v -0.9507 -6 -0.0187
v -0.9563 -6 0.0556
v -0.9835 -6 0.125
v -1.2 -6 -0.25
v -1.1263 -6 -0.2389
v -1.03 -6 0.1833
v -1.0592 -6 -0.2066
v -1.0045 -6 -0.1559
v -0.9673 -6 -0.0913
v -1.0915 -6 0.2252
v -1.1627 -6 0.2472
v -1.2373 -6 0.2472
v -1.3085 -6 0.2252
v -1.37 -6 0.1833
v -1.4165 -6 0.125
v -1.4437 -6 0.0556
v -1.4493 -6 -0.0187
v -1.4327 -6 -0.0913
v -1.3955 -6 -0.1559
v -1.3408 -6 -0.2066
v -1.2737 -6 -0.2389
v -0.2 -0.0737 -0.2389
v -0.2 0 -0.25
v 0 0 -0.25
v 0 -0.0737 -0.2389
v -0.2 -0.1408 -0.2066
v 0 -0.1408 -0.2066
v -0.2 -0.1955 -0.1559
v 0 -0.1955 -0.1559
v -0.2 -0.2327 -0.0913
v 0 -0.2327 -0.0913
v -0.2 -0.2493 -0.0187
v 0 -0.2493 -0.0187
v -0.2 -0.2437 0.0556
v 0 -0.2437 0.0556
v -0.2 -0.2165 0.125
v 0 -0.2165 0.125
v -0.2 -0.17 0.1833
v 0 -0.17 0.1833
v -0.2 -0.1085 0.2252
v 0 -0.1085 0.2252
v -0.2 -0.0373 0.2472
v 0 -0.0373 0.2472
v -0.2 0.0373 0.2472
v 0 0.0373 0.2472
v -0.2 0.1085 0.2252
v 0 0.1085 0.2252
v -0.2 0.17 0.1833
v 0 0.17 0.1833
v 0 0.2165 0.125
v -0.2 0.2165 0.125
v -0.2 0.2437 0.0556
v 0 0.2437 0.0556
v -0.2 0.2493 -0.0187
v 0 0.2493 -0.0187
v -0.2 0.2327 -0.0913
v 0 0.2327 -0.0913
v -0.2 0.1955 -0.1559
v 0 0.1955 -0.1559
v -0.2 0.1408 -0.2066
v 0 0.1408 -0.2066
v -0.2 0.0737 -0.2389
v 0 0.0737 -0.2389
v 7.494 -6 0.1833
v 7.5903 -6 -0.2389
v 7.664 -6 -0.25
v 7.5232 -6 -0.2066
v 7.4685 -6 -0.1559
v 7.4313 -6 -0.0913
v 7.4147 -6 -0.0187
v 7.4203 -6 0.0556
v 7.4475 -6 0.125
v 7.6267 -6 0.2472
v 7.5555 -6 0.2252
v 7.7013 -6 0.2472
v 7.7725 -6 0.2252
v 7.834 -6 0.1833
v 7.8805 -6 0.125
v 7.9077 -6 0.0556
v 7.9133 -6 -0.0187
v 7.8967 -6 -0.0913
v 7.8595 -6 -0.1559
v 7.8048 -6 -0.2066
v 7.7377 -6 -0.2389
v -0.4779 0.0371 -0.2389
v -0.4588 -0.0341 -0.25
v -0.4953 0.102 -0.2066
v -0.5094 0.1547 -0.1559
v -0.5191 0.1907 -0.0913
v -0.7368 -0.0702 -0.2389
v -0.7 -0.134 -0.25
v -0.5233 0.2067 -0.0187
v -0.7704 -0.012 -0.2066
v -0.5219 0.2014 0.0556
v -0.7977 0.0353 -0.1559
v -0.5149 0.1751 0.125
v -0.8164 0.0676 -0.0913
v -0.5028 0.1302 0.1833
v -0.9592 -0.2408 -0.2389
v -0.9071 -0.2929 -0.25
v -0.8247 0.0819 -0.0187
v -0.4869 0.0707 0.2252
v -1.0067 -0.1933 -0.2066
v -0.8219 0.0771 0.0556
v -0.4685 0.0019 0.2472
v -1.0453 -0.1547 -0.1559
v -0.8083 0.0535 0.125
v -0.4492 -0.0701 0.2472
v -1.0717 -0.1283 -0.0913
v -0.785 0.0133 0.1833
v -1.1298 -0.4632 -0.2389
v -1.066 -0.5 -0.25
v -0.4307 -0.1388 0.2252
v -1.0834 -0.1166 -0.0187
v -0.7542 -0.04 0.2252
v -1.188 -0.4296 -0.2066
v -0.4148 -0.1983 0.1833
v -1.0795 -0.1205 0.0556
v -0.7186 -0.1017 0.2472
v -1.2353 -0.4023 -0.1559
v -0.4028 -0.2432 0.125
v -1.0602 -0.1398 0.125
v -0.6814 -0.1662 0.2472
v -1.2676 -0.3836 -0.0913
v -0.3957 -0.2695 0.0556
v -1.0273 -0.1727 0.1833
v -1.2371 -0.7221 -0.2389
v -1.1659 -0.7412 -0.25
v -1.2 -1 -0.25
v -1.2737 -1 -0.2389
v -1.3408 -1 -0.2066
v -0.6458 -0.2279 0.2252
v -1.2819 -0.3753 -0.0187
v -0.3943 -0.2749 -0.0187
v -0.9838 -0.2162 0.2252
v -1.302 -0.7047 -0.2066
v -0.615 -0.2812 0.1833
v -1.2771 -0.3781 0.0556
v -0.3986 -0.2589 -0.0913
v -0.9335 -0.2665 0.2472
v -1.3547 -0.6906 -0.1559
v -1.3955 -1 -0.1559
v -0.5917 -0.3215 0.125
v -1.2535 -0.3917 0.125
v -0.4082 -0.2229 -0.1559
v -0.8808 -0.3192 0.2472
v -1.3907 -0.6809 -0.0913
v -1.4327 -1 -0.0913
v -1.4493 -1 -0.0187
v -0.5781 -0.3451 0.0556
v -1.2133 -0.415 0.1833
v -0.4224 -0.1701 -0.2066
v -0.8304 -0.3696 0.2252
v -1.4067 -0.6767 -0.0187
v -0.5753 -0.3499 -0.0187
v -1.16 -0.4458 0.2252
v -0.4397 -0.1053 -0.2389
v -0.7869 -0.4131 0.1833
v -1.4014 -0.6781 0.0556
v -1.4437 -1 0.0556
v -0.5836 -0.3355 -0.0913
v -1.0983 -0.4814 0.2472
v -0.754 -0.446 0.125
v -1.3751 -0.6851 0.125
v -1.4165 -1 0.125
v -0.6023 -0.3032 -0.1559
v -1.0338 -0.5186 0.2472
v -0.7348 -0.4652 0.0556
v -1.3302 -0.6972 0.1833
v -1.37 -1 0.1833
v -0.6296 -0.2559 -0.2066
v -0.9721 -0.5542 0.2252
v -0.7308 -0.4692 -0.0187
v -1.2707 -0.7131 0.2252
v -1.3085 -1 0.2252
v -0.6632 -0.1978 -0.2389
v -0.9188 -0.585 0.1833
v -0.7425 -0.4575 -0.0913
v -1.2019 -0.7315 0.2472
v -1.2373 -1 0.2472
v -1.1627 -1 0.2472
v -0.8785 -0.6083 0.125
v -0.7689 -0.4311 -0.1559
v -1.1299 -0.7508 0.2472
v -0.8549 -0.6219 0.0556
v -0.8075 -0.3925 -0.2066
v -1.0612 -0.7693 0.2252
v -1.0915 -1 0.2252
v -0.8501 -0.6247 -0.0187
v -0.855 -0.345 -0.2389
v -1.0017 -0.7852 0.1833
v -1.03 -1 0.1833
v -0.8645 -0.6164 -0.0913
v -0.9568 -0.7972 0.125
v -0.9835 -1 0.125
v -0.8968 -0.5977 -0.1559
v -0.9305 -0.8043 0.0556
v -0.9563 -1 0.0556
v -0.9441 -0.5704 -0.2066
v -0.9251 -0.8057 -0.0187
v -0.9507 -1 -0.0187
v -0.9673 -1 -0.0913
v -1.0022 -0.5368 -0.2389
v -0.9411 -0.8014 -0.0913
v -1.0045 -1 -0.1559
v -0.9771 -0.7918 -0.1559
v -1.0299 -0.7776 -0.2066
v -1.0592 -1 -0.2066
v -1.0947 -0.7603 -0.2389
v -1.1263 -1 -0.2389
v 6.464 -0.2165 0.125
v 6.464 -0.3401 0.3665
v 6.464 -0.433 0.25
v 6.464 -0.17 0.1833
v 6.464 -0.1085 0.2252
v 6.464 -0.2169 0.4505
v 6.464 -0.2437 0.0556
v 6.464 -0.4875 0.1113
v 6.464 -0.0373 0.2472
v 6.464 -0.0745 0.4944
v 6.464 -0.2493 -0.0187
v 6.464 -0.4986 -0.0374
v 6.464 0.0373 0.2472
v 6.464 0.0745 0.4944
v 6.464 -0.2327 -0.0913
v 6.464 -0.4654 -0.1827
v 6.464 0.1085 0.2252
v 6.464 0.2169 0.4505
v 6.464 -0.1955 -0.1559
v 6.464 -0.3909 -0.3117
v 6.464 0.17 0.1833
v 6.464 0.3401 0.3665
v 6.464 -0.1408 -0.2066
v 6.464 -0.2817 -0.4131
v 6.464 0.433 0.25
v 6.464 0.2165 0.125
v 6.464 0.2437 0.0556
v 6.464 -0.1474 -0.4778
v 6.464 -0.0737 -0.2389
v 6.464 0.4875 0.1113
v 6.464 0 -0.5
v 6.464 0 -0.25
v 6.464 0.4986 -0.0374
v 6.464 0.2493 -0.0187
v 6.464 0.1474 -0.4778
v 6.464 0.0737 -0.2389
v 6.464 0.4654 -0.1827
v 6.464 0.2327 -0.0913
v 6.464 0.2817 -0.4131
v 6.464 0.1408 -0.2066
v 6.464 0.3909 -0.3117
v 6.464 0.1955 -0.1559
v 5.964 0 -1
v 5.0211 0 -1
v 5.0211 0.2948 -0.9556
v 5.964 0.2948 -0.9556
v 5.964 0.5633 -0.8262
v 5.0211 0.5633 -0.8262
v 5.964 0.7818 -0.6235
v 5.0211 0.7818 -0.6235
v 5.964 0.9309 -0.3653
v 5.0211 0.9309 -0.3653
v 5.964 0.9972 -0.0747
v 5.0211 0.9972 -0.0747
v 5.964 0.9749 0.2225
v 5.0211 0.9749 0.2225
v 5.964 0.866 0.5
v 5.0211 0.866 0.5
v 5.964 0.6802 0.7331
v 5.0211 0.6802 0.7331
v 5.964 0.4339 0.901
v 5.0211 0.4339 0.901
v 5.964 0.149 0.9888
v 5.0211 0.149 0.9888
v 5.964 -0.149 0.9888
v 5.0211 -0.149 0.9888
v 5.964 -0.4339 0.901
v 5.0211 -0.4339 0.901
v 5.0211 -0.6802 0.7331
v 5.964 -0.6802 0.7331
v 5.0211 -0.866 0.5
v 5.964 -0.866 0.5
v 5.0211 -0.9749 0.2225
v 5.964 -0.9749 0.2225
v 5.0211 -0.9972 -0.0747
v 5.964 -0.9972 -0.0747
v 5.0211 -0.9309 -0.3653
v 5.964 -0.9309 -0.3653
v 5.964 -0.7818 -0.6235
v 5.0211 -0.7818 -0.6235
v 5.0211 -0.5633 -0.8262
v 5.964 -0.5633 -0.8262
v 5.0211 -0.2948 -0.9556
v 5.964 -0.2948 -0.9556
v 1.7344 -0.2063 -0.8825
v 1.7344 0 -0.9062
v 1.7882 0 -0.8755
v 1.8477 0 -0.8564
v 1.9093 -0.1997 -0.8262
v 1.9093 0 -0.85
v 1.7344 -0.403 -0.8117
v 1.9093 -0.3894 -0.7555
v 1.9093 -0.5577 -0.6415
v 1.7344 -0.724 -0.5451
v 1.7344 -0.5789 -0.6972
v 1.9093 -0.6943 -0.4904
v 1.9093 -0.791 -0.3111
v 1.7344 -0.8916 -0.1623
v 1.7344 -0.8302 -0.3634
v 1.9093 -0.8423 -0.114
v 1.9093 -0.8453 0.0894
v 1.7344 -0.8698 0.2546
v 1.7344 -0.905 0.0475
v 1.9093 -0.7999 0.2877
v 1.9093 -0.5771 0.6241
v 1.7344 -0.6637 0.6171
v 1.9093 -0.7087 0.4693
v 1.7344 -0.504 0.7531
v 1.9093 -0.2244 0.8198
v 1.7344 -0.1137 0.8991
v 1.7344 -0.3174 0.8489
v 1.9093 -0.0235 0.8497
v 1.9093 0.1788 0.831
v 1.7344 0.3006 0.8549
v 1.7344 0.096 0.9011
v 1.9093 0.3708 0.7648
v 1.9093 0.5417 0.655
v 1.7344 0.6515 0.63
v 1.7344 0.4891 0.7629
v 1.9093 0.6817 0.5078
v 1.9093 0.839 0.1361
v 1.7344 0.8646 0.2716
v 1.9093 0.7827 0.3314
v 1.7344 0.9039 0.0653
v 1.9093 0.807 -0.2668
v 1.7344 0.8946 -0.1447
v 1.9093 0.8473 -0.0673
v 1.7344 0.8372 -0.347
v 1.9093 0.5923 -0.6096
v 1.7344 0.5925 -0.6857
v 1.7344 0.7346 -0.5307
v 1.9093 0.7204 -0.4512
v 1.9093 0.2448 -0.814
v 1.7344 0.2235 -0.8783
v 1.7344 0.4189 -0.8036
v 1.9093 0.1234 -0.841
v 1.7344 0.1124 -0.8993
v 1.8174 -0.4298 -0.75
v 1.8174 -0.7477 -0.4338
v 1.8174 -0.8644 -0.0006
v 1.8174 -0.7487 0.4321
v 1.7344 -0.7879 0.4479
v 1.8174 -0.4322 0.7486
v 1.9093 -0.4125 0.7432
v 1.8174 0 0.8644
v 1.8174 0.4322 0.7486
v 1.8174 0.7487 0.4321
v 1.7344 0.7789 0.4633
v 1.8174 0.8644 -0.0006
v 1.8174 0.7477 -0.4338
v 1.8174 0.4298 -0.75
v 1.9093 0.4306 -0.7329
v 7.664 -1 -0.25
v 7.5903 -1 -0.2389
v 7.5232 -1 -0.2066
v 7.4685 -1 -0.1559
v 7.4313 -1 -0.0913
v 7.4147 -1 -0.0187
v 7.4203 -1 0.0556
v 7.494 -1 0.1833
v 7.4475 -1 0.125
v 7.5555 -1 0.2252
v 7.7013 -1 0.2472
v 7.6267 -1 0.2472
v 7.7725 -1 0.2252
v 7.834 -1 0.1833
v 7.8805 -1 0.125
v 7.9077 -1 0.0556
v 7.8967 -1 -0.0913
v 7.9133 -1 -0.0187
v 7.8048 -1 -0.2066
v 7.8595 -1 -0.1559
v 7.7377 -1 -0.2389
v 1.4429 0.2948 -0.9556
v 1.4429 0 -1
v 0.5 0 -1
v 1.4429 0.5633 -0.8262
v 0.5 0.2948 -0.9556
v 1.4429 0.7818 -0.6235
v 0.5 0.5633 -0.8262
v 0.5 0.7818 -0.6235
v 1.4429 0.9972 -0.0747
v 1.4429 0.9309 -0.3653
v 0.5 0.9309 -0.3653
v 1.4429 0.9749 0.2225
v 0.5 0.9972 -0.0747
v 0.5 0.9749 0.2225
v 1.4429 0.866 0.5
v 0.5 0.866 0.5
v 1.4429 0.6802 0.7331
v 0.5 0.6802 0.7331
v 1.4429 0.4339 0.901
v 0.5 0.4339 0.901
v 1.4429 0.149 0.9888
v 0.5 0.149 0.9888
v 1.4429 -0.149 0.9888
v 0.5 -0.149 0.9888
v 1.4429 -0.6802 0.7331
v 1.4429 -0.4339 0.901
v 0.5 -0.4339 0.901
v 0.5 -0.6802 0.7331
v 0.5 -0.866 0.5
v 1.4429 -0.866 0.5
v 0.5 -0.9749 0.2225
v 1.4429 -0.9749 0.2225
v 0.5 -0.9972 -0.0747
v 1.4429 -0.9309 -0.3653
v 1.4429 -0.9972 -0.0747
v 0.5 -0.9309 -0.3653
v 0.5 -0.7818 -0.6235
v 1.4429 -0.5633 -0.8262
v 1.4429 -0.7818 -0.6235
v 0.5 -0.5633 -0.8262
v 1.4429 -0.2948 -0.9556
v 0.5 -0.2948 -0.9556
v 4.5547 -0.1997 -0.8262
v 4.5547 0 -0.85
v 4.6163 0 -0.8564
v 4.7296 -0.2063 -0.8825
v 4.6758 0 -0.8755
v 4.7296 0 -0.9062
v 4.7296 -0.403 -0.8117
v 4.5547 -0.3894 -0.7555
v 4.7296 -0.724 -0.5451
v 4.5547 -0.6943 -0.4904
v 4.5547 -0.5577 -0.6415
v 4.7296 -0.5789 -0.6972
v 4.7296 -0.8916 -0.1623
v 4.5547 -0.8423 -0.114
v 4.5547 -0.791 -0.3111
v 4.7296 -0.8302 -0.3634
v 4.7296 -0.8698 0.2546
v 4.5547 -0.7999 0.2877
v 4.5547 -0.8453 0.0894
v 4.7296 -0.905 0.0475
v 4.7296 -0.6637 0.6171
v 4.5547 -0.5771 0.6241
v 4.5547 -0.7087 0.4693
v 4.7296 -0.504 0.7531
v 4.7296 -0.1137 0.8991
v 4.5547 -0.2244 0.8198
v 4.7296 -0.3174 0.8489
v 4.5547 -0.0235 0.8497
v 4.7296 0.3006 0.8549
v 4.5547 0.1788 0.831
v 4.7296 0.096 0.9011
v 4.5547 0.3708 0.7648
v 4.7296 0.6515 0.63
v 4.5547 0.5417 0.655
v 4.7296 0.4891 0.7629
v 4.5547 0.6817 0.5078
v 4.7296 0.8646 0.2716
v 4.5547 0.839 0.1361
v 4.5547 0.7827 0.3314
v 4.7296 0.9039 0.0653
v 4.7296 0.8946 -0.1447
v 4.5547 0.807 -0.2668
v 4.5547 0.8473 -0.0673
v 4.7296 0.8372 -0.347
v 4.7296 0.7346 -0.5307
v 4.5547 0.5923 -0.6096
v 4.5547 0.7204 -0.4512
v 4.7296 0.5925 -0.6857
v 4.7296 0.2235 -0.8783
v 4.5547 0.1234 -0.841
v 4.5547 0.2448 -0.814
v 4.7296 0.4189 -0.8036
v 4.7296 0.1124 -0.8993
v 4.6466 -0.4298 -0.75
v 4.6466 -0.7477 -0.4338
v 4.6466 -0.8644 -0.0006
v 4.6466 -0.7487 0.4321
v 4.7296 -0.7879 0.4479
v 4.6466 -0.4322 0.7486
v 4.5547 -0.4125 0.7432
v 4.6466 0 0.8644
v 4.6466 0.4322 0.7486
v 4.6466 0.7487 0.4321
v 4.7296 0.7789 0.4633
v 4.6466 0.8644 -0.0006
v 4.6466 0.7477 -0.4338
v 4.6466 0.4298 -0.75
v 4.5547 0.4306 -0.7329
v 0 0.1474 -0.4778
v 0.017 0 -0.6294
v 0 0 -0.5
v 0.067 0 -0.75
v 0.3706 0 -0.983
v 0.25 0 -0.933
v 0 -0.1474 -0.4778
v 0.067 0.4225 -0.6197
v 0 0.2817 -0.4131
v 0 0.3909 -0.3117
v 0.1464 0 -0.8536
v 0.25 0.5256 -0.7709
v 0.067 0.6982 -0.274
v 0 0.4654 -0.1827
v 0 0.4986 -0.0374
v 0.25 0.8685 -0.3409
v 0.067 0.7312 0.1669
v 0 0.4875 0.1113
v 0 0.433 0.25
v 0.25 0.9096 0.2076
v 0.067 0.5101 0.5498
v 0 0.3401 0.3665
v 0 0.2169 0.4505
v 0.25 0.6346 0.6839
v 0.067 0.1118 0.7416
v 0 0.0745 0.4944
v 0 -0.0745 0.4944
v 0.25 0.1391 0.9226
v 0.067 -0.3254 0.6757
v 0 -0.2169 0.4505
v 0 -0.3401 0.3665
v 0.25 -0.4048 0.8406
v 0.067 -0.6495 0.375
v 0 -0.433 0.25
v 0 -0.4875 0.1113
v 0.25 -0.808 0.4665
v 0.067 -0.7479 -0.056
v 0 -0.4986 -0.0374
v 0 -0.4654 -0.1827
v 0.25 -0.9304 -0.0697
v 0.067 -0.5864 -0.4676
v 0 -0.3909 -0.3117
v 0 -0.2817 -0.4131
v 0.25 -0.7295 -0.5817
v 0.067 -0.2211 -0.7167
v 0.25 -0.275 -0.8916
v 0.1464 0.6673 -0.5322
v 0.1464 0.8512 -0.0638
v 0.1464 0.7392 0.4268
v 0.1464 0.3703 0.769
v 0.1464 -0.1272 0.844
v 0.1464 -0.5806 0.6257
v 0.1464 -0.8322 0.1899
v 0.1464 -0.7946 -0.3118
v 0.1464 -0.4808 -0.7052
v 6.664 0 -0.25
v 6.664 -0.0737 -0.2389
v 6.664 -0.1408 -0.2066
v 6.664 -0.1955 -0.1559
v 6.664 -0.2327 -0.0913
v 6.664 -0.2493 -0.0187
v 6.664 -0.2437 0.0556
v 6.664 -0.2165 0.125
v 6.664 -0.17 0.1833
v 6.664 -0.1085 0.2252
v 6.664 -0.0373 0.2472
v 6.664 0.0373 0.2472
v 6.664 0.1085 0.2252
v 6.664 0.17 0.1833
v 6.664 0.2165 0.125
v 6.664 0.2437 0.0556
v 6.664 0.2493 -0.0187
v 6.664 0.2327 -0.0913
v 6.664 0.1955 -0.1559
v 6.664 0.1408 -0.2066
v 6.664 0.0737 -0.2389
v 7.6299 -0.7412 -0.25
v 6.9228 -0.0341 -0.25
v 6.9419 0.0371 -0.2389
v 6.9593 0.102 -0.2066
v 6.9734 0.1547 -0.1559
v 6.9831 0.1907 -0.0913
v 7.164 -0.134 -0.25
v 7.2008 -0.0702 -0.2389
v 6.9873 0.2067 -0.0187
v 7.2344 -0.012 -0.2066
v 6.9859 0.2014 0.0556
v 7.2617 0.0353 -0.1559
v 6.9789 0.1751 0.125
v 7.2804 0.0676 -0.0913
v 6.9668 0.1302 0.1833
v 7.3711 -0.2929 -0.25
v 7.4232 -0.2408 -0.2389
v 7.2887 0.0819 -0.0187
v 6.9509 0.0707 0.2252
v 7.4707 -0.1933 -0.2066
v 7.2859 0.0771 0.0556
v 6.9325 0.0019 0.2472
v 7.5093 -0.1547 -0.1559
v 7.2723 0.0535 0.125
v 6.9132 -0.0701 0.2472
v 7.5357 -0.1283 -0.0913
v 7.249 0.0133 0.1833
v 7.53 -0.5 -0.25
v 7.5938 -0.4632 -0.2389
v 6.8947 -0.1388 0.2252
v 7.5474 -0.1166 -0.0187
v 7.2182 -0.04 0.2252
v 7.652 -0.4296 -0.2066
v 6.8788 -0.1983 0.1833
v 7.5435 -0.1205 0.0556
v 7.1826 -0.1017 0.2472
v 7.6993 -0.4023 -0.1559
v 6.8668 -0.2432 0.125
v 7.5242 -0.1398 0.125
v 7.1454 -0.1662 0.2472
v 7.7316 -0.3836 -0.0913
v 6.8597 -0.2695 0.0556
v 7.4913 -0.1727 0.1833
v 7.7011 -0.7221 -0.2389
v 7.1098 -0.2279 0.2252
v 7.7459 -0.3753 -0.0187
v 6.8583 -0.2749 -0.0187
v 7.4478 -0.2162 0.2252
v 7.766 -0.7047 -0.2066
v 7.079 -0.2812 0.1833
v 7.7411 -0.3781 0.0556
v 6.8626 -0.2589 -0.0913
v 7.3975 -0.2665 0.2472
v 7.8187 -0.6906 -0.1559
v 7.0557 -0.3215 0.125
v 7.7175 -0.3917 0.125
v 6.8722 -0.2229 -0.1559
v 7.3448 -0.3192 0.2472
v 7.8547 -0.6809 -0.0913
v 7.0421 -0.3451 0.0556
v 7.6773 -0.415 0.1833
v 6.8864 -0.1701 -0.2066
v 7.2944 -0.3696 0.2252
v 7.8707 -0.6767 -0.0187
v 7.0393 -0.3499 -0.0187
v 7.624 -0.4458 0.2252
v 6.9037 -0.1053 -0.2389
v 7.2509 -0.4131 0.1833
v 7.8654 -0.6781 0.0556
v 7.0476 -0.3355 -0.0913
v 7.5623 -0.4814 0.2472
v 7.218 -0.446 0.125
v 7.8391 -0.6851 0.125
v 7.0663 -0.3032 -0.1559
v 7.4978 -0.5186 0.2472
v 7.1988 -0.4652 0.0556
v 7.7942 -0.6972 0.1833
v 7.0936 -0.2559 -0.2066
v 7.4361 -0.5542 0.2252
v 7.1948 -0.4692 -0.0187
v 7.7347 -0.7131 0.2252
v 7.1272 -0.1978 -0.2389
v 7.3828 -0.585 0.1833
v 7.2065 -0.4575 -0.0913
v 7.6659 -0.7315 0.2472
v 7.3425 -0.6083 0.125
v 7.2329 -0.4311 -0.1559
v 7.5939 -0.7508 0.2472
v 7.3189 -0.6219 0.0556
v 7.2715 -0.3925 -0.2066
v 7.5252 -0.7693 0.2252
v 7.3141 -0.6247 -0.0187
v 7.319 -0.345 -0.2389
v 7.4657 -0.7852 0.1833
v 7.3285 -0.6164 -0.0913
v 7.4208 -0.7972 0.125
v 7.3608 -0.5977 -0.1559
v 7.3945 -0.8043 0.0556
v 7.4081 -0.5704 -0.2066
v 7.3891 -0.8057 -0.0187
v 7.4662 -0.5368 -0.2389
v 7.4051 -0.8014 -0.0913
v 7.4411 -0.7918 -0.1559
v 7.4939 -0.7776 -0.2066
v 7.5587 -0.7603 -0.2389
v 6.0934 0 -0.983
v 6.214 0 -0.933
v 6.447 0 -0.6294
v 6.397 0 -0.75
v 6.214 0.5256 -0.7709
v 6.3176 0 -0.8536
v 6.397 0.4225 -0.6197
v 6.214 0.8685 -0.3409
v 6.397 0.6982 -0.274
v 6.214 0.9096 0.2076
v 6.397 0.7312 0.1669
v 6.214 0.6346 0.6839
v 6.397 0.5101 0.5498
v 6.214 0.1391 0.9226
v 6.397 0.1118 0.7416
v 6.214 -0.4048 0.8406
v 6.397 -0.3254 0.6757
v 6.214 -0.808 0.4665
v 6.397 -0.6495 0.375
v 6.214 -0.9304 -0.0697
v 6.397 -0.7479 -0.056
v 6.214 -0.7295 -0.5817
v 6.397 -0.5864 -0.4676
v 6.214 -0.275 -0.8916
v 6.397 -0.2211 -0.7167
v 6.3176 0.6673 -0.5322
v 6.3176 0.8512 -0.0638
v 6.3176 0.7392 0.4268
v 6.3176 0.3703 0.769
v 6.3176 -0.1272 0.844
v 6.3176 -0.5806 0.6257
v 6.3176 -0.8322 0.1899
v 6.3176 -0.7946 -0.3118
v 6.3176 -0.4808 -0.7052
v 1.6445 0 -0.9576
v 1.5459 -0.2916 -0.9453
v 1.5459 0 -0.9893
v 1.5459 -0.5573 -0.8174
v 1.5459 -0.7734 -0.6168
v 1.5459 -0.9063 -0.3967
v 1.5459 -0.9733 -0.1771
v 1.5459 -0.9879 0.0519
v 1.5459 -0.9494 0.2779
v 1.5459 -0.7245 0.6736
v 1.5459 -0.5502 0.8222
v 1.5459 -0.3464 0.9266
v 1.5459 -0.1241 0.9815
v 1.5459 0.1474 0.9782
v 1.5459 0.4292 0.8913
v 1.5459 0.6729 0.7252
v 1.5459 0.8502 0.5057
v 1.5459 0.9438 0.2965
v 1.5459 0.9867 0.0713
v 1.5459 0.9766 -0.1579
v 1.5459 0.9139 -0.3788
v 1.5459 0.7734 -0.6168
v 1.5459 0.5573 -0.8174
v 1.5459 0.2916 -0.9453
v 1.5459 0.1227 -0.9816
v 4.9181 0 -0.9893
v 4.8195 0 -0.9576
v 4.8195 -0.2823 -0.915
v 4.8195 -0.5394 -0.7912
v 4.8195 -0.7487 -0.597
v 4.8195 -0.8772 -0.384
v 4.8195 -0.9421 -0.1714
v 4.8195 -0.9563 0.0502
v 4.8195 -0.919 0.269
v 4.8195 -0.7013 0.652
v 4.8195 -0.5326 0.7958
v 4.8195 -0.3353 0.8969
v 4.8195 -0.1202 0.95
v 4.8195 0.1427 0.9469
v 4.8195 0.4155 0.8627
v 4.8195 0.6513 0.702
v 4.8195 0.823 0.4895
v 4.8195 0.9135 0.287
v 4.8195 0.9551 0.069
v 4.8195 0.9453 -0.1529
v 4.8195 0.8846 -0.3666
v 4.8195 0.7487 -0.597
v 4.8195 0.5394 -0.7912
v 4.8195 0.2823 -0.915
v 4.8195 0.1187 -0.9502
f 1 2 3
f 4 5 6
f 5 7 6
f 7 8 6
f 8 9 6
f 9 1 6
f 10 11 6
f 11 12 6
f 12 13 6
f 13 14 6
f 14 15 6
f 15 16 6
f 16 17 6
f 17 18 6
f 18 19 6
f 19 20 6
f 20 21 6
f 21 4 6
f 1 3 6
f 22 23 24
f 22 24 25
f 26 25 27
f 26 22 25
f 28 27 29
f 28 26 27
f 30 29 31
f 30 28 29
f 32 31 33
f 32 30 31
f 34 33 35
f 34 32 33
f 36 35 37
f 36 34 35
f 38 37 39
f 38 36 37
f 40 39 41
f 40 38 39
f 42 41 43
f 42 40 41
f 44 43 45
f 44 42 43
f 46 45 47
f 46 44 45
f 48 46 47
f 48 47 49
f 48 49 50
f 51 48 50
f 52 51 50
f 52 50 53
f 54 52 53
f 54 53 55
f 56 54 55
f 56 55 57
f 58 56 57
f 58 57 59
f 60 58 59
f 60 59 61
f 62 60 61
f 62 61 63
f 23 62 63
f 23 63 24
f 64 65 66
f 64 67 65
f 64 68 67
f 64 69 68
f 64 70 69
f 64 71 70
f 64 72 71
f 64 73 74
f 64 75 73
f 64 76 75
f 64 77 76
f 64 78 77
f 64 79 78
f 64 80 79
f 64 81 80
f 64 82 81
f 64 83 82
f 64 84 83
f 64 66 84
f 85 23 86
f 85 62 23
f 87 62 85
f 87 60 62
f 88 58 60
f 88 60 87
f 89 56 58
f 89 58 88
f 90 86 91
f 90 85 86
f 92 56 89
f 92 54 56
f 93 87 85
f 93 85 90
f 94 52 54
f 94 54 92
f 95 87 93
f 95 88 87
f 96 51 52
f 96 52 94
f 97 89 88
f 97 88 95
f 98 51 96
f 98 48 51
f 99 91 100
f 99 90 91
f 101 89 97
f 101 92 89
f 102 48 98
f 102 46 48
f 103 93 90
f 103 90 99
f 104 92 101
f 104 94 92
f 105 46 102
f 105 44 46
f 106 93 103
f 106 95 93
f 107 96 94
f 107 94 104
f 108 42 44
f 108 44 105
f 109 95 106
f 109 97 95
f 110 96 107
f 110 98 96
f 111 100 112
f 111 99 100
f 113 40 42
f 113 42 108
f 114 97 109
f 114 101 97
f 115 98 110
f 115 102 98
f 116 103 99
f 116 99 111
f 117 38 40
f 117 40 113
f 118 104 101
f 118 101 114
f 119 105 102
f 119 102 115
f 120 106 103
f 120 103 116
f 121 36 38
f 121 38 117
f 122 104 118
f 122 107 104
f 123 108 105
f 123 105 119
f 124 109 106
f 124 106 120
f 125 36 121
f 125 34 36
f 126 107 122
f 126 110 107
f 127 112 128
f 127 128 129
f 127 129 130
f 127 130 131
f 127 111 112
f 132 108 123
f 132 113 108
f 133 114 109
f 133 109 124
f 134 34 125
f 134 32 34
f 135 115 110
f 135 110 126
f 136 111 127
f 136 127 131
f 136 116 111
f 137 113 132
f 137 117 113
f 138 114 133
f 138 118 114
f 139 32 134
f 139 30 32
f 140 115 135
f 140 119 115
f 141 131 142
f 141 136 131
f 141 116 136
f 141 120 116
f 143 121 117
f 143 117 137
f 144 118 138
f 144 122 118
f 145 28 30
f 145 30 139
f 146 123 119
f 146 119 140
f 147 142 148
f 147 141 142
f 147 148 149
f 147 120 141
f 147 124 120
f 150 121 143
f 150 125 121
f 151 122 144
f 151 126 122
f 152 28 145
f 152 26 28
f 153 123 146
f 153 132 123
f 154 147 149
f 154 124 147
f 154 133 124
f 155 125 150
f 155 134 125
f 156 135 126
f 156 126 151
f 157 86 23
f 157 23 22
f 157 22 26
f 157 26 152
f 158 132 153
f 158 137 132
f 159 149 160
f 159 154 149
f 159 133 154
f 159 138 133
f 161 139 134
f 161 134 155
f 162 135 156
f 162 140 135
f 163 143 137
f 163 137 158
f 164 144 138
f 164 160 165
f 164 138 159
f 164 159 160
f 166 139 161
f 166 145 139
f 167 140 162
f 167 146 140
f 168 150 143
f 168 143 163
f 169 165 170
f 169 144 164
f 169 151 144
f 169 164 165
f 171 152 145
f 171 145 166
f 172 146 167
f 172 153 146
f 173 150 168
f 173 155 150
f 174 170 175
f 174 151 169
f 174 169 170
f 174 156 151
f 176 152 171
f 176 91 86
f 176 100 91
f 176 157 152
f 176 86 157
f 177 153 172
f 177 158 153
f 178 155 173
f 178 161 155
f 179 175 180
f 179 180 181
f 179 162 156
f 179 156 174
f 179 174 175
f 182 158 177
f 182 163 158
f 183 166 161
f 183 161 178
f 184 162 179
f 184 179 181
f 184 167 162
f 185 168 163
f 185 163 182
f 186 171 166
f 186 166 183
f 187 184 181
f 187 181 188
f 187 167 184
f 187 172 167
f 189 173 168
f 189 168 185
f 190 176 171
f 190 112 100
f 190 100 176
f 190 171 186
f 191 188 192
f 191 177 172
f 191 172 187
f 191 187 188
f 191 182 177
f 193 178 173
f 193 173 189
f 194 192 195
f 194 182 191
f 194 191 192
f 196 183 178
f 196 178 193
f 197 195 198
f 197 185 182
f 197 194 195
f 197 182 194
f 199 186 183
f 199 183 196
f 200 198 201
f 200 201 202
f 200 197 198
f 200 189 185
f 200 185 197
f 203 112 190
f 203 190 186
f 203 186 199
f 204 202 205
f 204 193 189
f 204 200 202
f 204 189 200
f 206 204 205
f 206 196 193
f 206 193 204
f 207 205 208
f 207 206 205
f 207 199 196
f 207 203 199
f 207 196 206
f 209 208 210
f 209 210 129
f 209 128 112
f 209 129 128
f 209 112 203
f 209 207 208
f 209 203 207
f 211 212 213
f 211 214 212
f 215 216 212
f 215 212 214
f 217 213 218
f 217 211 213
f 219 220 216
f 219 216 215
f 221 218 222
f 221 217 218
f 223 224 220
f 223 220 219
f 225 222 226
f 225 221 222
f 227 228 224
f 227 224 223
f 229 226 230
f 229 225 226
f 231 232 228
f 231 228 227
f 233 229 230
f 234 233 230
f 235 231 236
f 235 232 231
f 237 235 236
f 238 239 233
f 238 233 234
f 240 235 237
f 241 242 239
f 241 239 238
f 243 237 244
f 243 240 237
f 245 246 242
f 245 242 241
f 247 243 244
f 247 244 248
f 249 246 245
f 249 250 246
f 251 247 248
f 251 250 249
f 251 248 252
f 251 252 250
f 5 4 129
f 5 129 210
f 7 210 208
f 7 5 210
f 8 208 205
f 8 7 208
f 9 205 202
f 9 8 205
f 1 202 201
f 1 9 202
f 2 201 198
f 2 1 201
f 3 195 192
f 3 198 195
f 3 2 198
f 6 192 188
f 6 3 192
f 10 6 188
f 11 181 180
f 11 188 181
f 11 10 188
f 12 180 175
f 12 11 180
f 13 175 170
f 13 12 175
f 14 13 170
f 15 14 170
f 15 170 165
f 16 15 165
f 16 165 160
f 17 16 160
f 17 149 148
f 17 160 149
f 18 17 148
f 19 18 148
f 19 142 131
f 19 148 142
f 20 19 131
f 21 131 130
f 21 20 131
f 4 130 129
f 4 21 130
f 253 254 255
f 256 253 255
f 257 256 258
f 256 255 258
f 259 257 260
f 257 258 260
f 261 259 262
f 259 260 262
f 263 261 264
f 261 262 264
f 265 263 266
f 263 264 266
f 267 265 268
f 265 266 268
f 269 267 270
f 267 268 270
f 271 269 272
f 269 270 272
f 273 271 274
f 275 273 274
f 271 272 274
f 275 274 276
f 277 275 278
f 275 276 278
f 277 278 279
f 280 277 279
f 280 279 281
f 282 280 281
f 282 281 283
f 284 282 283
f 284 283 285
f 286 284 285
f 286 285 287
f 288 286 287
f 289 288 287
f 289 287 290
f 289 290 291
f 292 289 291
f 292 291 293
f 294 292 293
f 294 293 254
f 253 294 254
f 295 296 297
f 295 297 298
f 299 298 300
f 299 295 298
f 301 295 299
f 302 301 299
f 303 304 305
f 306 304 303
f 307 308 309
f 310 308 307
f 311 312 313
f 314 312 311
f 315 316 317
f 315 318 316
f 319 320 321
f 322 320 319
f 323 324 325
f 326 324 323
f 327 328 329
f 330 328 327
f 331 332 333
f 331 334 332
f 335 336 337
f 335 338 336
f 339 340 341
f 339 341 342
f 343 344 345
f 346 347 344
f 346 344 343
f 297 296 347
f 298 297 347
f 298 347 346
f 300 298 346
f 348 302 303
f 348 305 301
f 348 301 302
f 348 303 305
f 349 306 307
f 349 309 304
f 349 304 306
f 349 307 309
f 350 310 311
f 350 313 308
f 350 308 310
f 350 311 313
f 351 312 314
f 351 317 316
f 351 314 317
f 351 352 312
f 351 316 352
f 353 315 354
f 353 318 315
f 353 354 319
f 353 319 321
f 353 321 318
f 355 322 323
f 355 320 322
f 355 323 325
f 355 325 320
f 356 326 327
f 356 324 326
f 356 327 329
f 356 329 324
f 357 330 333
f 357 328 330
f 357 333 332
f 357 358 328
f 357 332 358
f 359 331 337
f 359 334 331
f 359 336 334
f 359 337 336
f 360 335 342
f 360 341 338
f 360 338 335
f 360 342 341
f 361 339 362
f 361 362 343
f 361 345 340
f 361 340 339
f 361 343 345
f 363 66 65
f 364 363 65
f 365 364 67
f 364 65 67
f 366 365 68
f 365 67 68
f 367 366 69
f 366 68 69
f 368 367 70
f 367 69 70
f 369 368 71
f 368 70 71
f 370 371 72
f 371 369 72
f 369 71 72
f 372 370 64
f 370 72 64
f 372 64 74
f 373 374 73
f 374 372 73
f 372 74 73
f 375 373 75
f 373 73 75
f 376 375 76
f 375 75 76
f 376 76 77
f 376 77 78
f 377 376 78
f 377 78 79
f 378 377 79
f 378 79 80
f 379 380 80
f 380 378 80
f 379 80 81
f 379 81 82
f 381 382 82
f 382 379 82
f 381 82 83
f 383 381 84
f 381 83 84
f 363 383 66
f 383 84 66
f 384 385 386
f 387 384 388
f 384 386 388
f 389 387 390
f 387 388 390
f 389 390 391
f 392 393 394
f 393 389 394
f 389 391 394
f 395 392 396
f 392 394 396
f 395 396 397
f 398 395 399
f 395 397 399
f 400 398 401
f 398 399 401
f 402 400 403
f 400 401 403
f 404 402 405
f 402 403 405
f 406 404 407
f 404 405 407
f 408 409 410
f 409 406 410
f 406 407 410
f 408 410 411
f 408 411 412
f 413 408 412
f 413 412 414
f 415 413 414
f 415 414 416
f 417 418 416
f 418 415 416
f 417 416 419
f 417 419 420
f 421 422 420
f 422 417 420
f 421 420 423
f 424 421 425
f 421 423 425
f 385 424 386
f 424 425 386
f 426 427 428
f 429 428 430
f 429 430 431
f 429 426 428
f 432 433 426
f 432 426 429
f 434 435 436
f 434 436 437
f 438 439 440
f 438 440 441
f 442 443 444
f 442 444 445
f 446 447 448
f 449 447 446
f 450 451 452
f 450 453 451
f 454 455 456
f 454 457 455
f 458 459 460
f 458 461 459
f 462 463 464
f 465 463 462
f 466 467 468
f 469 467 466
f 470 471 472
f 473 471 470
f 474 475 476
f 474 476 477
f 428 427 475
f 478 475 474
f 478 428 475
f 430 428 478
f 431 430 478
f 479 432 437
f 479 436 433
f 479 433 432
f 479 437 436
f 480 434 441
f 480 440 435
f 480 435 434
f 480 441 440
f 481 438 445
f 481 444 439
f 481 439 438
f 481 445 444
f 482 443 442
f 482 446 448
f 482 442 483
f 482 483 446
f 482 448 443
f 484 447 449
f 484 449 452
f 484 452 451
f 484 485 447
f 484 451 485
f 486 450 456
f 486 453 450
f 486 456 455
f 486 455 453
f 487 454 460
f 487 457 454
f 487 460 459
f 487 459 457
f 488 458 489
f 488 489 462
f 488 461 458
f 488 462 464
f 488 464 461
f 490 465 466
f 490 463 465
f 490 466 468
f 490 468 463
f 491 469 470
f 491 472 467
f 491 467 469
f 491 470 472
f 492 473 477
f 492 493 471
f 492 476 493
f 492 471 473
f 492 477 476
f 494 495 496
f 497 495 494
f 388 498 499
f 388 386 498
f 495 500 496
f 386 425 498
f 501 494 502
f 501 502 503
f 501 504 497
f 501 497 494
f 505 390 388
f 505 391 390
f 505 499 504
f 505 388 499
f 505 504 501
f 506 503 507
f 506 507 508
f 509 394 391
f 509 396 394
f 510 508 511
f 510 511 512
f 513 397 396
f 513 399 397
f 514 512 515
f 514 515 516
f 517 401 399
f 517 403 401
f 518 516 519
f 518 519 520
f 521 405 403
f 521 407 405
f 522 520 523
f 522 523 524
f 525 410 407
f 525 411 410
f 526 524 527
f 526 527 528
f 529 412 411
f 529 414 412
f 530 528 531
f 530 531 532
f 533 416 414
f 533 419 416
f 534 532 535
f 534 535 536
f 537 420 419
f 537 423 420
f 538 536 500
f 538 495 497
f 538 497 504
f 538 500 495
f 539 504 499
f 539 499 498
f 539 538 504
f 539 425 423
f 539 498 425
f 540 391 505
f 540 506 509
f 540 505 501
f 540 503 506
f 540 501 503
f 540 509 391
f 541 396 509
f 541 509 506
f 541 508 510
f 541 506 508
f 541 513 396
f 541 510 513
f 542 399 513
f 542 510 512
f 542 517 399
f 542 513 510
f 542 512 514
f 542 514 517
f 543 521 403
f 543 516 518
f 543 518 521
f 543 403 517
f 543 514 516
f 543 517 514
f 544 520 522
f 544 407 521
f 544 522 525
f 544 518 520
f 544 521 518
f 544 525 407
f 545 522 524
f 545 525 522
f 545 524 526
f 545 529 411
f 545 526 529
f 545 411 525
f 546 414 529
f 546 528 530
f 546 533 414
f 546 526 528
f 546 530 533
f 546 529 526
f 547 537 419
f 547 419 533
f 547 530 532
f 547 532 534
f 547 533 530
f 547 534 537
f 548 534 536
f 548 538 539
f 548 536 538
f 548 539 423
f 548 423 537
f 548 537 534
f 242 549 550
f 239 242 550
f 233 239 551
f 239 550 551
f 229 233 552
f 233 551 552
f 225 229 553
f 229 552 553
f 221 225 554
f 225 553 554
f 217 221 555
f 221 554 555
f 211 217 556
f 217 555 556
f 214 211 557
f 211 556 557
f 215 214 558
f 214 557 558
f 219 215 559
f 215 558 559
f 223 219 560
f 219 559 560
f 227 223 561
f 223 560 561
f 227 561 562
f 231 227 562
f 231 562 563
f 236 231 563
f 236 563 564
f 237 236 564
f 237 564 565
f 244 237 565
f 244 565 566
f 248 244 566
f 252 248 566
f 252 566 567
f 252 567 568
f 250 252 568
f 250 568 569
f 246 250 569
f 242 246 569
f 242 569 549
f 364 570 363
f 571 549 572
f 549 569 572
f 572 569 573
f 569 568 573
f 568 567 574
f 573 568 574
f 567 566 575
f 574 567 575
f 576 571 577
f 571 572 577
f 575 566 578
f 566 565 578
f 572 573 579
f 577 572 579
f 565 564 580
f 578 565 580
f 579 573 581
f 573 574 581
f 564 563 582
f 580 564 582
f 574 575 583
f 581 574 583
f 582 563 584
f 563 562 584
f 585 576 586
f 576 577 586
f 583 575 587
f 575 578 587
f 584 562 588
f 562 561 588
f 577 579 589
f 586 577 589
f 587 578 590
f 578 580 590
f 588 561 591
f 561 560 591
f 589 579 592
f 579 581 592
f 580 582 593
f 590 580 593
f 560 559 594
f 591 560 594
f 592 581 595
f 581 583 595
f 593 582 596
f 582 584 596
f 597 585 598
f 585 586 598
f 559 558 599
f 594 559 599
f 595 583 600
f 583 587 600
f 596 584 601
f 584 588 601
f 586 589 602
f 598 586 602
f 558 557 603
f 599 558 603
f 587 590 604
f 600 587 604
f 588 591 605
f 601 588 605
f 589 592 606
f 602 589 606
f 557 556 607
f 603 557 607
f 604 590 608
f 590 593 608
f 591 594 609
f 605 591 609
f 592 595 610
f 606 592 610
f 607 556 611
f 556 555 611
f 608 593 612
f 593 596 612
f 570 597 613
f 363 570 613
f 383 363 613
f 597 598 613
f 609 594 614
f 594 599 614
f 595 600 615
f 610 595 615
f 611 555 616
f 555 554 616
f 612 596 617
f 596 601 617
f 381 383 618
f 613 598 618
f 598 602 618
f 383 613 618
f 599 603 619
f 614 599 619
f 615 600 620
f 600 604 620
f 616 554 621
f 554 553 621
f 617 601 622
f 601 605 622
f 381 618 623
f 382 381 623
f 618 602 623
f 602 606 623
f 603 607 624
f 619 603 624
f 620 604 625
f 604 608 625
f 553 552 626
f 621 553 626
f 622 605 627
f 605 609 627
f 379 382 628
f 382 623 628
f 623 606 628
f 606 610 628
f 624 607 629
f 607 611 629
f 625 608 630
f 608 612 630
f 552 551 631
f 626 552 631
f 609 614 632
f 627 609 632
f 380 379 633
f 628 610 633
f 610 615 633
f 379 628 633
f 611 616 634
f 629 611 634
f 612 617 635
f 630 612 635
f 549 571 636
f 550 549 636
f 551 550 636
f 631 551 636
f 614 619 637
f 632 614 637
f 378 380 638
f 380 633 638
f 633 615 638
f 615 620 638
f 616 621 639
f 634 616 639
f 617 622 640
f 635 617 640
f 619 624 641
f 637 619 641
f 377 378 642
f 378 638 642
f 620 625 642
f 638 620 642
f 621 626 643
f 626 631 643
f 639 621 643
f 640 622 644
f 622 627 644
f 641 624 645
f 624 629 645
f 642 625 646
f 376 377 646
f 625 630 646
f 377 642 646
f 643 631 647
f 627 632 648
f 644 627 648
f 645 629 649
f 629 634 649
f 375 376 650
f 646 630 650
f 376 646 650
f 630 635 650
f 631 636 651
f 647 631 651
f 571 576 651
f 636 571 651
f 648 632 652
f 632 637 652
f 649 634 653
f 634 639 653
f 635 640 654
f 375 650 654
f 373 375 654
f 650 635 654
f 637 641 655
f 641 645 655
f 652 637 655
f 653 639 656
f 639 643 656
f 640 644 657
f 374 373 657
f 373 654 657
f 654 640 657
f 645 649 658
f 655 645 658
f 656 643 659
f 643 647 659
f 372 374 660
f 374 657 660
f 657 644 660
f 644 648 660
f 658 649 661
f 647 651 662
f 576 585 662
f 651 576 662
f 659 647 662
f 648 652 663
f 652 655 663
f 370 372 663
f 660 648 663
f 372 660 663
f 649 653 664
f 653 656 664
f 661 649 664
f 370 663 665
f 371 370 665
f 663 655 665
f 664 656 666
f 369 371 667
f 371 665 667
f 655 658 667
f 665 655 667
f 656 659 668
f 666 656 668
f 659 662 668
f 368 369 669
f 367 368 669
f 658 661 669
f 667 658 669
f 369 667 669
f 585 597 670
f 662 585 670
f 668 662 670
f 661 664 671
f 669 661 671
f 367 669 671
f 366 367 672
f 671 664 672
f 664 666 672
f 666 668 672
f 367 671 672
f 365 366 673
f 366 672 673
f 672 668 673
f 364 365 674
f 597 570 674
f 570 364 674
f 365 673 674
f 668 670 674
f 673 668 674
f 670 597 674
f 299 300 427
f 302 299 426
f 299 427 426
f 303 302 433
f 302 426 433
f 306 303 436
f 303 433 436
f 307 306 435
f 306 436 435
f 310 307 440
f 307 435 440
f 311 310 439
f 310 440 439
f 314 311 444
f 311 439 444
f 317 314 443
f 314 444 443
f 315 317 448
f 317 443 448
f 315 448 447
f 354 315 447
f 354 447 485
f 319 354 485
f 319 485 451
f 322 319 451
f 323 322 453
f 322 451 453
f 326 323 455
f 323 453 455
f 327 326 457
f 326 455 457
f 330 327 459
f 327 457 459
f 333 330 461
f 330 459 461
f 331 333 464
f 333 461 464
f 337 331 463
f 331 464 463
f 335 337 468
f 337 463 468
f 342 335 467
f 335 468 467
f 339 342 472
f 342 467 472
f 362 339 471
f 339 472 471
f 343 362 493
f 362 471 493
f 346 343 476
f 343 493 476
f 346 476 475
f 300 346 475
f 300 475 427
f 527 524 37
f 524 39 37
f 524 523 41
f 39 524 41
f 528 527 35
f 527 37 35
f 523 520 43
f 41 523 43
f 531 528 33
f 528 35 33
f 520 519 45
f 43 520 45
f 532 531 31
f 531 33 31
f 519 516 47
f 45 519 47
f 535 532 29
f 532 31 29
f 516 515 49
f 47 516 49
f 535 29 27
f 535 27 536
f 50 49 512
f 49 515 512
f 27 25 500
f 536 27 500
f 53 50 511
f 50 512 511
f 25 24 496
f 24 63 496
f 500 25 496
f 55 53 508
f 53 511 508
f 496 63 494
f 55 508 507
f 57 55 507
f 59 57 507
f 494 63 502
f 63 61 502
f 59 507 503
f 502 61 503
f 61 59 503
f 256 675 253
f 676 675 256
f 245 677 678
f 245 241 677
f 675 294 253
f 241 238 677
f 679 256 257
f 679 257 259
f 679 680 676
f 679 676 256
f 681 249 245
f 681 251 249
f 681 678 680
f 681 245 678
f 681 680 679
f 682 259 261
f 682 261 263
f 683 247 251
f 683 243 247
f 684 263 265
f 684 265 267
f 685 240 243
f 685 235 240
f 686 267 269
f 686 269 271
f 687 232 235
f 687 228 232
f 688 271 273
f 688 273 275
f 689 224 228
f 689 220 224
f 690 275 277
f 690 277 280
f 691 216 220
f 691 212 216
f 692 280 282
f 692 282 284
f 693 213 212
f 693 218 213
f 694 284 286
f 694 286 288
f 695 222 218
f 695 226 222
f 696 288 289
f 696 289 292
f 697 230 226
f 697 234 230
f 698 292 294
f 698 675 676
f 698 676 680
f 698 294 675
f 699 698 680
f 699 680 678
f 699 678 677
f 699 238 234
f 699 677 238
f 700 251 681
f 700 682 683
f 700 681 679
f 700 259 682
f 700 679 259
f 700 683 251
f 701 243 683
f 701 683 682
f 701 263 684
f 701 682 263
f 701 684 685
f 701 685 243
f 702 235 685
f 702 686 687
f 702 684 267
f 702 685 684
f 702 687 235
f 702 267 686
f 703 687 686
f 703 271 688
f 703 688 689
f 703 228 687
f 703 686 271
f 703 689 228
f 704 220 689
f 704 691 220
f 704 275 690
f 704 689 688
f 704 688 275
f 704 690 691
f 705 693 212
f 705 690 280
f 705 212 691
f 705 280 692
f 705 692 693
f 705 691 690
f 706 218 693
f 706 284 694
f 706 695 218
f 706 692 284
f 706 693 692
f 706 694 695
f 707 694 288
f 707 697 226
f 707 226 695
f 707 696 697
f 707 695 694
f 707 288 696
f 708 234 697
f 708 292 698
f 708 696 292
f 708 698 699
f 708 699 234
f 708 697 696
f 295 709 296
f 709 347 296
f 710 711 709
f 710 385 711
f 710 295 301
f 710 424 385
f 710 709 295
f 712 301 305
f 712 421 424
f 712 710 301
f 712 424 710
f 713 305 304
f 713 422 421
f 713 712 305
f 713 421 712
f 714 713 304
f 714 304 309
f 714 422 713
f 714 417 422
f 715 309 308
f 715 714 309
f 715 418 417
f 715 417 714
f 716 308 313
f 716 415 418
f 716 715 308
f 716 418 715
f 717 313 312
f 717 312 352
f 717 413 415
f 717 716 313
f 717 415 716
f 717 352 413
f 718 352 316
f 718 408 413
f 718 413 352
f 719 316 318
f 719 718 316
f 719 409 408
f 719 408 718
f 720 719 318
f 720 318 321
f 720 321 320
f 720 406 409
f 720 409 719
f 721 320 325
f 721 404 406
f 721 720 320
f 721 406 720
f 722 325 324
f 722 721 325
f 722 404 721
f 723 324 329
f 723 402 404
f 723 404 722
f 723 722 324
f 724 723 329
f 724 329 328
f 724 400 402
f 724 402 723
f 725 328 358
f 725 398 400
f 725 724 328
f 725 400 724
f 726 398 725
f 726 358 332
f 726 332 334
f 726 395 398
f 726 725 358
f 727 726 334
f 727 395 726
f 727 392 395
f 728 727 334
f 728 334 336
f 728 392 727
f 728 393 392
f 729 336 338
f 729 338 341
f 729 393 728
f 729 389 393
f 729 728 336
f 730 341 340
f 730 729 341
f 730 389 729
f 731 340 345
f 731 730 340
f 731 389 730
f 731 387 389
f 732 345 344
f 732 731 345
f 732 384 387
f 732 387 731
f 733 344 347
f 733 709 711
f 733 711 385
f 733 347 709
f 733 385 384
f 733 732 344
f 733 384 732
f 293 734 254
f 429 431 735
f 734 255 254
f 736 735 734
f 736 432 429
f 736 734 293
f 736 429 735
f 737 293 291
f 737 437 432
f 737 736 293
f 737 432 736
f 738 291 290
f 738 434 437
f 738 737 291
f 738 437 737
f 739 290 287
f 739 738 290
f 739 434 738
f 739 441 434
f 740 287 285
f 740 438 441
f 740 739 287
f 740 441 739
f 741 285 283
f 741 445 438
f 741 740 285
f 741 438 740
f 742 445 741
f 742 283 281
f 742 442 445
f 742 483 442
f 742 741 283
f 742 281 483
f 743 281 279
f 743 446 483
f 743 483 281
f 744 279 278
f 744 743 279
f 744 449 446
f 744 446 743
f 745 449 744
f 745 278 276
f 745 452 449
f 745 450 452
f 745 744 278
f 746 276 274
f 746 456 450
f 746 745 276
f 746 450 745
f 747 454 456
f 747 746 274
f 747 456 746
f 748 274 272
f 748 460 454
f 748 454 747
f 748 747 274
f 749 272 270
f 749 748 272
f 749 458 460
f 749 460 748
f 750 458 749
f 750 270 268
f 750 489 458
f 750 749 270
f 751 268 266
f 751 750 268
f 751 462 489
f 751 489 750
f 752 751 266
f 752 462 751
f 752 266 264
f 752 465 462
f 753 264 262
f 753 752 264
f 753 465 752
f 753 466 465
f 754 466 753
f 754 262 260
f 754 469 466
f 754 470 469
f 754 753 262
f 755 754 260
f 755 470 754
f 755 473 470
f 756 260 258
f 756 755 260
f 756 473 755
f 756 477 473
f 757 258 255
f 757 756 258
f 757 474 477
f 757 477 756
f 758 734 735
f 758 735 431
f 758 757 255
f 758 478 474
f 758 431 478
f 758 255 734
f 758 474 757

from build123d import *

# Parameters (mm, degrees)
SKETCH58_R          = 1
BOSS_EXTRUDE1_DEPTH = 6.464
SKETCH59_W          = 2.864
SKETCH59_H          = 0.3
FILLET6_R           = 0.5
FILLET7_R           = 0.3
SKETCH54_R          = 0.25


with BuildPart() as part:
    # Sketch58 → Boss-Extrude1 (new body)
    with BuildSketch(Plane(origin=(0, 0, 0), x_dir=(0, 0, -1), z_dir=(1, 0, 0))):
        Circle(SKETCH58_R)
    extrude(amount=BOSS_EXTRUDE1_DEPTH)

    # Sketch59 → Cut-Revolve1 (revolve, cut)
    with BuildSketch(Plane.XY, mode=Mode.PRIVATE) as cut_revolve1_sk:
        with Locations((3.232, 1)):
            Rectangle(SKETCH59_W, SKETCH59_H)
    revolve(cut_revolve1_sk.sketch.rotate(Axis((6.464, 0, 0), (-1, 0, 0)), 90), axis=Axis((6.464, 0, 0), (-1, 0, 0)), mode=Mode.SUBTRACT)

    # Fillet6
    # the kernel refuses this fillet: 0.5 mm, written as the material it takes off along each edge
    with BuildSketch(Plane(origin=(0, 0, 0), x_dir=(0, 0, -1), z_dir=(0, -1, 0))) as fillet6_piece_1:
        with BuildLine():
            CenterArc((1 - FILLET6_R, FILLET6_R), FILLET6_R, 270, 90)
            Line((1 - FILLET6_R, 0), (1 - FILLET6_R, -FILLET6_R * 0.02))
            Line((1 - FILLET6_R, -FILLET6_R * 0.02), (1 + FILLET6_R * 0.02, -FILLET6_R * 0.02))
            Line((1 + FILLET6_R * 0.02, -FILLET6_R * 0.02), (1 + FILLET6_R * 0.02, FILLET6_R))
            Line((1 + FILLET6_R * 0.02, FILLET6_R), (1, FILLET6_R))
        make_face()
    revolve(axis=Axis((0, 0, 0), (1, 0, 0)), mode=Mode.SUBTRACT)
    with BuildSketch(Plane(origin=(6.464, 0, 0), x_dir=(0, 0, -1), z_dir=(0, -1, 0))) as fillet6_piece_2:
        with BuildLine():
            CenterArc((1 - FILLET6_R, -FILLET6_R), FILLET6_R, 0, 90)
            Line((1 - FILLET6_R, 0), (1 - FILLET6_R, FILLET6_R * 0.02))
            Line((1 - FILLET6_R, FILLET6_R * 0.02), (1 + FILLET6_R * 0.02, FILLET6_R * 0.02))
            Line((1 + FILLET6_R * 0.02, FILLET6_R * 0.02), (1 + FILLET6_R * 0.02, -FILLET6_R))
            Line((1 + FILLET6_R * 0.02, -FILLET6_R), (1, -FILLET6_R))
        make_face()
    revolve(axis=Axis((6.464, 0, 0), (1, 0, 0)), mode=Mode.SUBTRACT)
    with BuildSketch(Plane(origin=(1.8, 0, 0), x_dir=(0, 0, -1), z_dir=(0, 1, 0))) as fillet6_piece_3:
        with BuildLine():
            CenterArc((0.5, 0.357071421), FILLET6_R, 314.427004001, 45.572995999)
            Line((0.85, 0), (0.857, -0.007141428))
            ThreePointArc((0.857, -0.007141428), (0.925, -0.01), (1, -0.01))
            Line((1, -0.01), (1.01, 0))
            Line((1.01, 0), (1.01, 0.357071421))
            Line((1.01, 0.357071421), (1, 0.357071421))
        make_face()
    revolve(axis=Axis((1.8, 0, 0), (-1, 0, 0)), mode=Mode.SUBTRACT)
    with BuildSketch(Plane(origin=(4.664, 0, 0), x_dir=(0, 0, -1), z_dir=(0, 1, 0))) as fillet6_piece_4:
        with BuildLine():
            CenterArc((0.5, -0.357071421), FILLET6_R, 0, 45.572995999)
            Line((1, -0.357071421), (1.01, -0.357071421))
            Line((1.01, -0.357071421), (1.01, 0))
            Line((1.01, 0), (1, 0.01))
            ThreePointArc((1, 0.01), (0.925, 0.01), (0.857, 0.007141428))
            Line((0.857, 0.007141428), (0.85, 0))
        make_face()
    revolve(axis=Axis((4.664, 0, 0), (-1, 0, 0)), mode=Mode.SUBTRACT)

    # Fillet7
    fillet7_edges = [part.edges().sort_by_distance(p)[0] for p in [
        (1.8, 0, 0.85),
        (4.664, 0, 0.85),
    ]]
    fillet(fillet7_edges, radius=FILLET7_R)

    # Sweep1: sweep along a path in Sketch55
    with BuildLine(Plane.XY) as sweep1_path:
        Line((0, 0), (-0.2, 0))
        ThreePointArc((-0.2, 0), (-0.907106781, -0.292893219), (-1.2, -1))
        Line((-1.2, -1), (-1.2, -6))
    # Sketch54 → Sweep1 (sweep)
    with BuildSketch(Plane(origin=(0, 0, 0), x_dir=(0, 0, -1), z_dir=(1, 0, 0))):
        Circle(SKETCH54_R)
    sweep1 = sweep(path=sweep1_path.line)

    # Mirror1: Sweep1 across plane
    add(sweep1.mirror(Plane(origin=(3.232, 0, 0), x_dir=(0, 0, 1), z_dir=(1, 0, 0))))


solid = part.part
